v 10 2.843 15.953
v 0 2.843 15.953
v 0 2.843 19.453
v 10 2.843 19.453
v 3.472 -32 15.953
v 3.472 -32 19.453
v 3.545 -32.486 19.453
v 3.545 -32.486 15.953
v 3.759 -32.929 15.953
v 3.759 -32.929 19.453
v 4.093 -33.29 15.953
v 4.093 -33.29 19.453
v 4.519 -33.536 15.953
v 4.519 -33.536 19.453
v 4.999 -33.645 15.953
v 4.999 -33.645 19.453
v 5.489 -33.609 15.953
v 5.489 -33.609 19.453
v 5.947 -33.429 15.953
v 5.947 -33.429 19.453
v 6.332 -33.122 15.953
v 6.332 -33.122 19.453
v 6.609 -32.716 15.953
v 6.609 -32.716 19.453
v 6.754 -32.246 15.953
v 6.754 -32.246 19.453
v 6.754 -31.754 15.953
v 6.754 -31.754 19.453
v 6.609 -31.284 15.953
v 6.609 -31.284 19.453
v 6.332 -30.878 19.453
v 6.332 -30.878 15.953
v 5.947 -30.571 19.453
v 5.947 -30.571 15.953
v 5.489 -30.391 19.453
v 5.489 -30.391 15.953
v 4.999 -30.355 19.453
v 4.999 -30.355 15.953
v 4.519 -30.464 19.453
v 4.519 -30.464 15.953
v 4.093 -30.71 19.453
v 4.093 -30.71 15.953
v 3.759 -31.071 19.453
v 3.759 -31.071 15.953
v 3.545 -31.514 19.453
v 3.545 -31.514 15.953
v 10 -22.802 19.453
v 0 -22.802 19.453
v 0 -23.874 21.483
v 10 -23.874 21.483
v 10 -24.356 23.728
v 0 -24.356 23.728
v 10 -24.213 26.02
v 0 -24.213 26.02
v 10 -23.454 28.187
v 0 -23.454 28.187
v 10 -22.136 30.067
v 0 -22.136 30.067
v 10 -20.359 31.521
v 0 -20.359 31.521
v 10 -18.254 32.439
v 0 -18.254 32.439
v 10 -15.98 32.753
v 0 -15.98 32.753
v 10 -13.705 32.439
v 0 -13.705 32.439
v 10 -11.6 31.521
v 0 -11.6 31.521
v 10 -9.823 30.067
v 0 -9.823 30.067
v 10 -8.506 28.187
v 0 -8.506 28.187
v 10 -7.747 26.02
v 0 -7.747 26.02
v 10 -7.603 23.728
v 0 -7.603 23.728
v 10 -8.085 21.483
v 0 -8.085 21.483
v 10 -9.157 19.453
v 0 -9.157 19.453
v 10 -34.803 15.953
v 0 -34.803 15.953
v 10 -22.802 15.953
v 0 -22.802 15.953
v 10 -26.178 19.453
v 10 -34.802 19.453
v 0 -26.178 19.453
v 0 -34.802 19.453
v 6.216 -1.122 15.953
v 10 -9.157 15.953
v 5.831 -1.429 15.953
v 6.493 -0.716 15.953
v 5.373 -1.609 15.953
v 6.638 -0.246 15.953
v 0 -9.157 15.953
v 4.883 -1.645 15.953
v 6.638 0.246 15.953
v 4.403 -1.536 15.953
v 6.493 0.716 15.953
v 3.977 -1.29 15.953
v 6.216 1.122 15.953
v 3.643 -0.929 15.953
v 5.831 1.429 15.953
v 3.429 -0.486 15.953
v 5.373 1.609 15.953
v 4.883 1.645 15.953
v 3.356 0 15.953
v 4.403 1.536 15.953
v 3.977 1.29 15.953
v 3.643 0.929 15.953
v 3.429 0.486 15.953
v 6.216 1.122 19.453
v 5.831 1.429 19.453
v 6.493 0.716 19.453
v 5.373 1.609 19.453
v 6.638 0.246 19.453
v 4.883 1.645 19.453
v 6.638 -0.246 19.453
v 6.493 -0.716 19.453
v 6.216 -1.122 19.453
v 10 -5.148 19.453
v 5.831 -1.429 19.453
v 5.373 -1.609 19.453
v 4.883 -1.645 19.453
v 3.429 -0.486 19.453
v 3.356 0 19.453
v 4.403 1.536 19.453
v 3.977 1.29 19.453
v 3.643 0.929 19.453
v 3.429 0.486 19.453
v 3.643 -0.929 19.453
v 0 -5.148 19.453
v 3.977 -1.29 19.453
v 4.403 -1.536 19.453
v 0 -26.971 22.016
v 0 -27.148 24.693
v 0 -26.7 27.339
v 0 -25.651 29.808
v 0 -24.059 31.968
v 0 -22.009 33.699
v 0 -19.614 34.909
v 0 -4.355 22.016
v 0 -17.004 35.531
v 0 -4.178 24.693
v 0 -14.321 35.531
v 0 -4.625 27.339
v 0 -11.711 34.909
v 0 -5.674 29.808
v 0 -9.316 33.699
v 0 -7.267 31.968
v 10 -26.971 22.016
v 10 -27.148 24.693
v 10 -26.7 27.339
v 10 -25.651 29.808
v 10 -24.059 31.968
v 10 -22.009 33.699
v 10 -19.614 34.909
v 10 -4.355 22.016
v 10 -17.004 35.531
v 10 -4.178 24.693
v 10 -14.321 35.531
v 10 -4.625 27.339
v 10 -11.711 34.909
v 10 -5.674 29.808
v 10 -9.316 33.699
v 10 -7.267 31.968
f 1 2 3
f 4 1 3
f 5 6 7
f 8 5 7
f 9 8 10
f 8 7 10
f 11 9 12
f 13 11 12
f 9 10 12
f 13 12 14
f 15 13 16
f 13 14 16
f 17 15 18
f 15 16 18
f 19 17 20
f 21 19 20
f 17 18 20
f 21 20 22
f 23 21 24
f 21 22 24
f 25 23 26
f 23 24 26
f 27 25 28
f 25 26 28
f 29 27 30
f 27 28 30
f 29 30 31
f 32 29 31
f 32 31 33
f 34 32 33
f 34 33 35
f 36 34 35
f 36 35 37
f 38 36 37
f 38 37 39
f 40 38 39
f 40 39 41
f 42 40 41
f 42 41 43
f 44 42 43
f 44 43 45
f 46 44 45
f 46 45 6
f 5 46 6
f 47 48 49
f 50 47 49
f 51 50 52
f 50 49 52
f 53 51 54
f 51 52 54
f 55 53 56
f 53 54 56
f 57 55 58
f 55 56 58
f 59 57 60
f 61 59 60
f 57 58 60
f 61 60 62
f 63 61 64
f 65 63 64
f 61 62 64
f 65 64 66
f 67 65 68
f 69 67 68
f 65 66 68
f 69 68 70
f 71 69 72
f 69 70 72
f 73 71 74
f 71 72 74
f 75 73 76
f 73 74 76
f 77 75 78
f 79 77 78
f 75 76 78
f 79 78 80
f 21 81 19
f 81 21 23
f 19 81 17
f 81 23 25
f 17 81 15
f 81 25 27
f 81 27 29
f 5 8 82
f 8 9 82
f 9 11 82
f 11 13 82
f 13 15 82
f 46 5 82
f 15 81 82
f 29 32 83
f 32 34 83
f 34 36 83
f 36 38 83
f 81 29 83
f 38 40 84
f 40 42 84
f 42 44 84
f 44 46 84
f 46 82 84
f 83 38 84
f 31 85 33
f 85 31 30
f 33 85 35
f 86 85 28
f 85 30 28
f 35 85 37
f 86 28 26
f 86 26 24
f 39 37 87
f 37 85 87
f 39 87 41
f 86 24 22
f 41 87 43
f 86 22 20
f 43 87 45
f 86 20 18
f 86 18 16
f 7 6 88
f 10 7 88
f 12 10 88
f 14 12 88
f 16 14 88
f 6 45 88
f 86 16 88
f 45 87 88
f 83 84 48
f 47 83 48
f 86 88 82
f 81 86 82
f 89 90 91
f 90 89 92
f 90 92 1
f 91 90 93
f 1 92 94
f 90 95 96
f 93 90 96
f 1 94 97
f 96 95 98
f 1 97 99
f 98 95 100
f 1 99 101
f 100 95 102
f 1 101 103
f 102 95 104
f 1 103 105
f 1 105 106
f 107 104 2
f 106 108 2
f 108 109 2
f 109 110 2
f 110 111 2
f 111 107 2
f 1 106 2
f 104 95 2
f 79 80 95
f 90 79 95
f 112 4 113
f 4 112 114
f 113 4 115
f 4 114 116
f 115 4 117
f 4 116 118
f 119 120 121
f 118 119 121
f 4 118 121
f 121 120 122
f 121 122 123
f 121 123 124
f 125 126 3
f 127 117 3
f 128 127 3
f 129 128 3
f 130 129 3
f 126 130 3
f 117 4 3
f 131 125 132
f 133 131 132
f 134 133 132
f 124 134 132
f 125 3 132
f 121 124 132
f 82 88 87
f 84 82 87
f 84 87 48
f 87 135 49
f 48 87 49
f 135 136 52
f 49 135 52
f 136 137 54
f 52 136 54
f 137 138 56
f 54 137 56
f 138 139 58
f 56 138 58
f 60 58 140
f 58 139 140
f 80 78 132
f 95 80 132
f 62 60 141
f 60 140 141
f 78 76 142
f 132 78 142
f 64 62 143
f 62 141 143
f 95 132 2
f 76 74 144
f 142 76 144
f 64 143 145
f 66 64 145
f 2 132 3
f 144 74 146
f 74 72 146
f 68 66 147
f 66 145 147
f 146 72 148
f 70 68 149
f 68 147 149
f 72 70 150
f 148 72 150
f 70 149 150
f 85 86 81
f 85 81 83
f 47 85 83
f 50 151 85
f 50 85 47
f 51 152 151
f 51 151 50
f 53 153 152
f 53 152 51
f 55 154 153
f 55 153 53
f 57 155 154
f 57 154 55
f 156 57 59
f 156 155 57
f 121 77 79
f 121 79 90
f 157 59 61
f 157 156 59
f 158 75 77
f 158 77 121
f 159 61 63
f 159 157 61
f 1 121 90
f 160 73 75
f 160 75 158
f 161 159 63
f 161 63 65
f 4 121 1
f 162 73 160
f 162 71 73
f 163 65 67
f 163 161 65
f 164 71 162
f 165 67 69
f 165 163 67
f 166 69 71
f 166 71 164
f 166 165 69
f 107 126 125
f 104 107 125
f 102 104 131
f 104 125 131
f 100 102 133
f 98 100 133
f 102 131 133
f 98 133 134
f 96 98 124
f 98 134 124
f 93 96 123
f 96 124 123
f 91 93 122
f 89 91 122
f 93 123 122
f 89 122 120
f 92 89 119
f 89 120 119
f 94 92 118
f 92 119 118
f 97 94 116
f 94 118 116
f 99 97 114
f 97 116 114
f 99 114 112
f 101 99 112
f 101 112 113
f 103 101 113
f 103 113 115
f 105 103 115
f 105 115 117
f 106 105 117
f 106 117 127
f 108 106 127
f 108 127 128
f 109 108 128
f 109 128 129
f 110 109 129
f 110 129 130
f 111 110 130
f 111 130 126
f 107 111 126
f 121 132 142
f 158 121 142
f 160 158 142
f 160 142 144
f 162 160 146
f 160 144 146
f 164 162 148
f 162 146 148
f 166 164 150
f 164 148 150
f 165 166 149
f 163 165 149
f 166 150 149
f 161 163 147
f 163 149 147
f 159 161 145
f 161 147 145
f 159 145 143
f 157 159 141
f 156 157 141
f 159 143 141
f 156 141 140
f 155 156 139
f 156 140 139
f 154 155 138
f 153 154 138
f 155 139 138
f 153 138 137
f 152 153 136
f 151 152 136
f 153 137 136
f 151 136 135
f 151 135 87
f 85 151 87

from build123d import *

# Parameters (mm, degrees)
F1_DEPTH = 10
F3_D     = 3.3
F4_D     = 3.3


with BuildPart() as f1:
    # F0 (on Right) → F1 (new body)
    with BuildSketch(Plane.YZ):
        with BuildLine():
            ThreePointArc((-22.8023384852, 19.4527051061), (-15.9795824438, 32.7527051061), (-9.1568264025, 19.4527051061))
            Line((-9.1568264025, 19.4527051061), (-5.1476741432, 19.4527051061))
            ThreePointArc((-5.1476741432, 19.4527051061), (-15.6627106592, 35.6093140728), (-26.1777471751, 19.4527051061))
            Line((-26.1777471751, 19.4527051061), (-22.8023384852, 19.4527051061))
        make_face()
        Polygon((-5.1476741432, 19.4527051061), (-9.1568264025, 19.4527051061), (-9.1568264025, 15.9527051061), (2.8431735975, 15.9527051061), (2.8431735975, 19.4527051061), align=None)
        Polygon((-22.8023384852, 15.9527051061), (-22.8023384852, 19.4527051061), (-26.1777471751, 19.4527051061), (-34.8023384852, 19.4527051061), (-34.8025824438, 15.9527051061), align=None)
    extrude(amount=F1_DEPTH)

    # F3 (through all)
    with Locations(Plane(origin=(0, 0, 0), x_dir=(1, 0, 0), z_dir=(0, 0, -1))):
        with Locations((5.1220096648, 32)):
            Hole(F3_D / 2)

    # F4 (through all)
    with Locations(Plane(origin=(0, 0, 0), x_dir=(1, 0, 0), z_dir=(0, 0, -1))):
        with Locations((5.00610983, 0)):
            Hole(F4_D / 2)


solid = f1.part
